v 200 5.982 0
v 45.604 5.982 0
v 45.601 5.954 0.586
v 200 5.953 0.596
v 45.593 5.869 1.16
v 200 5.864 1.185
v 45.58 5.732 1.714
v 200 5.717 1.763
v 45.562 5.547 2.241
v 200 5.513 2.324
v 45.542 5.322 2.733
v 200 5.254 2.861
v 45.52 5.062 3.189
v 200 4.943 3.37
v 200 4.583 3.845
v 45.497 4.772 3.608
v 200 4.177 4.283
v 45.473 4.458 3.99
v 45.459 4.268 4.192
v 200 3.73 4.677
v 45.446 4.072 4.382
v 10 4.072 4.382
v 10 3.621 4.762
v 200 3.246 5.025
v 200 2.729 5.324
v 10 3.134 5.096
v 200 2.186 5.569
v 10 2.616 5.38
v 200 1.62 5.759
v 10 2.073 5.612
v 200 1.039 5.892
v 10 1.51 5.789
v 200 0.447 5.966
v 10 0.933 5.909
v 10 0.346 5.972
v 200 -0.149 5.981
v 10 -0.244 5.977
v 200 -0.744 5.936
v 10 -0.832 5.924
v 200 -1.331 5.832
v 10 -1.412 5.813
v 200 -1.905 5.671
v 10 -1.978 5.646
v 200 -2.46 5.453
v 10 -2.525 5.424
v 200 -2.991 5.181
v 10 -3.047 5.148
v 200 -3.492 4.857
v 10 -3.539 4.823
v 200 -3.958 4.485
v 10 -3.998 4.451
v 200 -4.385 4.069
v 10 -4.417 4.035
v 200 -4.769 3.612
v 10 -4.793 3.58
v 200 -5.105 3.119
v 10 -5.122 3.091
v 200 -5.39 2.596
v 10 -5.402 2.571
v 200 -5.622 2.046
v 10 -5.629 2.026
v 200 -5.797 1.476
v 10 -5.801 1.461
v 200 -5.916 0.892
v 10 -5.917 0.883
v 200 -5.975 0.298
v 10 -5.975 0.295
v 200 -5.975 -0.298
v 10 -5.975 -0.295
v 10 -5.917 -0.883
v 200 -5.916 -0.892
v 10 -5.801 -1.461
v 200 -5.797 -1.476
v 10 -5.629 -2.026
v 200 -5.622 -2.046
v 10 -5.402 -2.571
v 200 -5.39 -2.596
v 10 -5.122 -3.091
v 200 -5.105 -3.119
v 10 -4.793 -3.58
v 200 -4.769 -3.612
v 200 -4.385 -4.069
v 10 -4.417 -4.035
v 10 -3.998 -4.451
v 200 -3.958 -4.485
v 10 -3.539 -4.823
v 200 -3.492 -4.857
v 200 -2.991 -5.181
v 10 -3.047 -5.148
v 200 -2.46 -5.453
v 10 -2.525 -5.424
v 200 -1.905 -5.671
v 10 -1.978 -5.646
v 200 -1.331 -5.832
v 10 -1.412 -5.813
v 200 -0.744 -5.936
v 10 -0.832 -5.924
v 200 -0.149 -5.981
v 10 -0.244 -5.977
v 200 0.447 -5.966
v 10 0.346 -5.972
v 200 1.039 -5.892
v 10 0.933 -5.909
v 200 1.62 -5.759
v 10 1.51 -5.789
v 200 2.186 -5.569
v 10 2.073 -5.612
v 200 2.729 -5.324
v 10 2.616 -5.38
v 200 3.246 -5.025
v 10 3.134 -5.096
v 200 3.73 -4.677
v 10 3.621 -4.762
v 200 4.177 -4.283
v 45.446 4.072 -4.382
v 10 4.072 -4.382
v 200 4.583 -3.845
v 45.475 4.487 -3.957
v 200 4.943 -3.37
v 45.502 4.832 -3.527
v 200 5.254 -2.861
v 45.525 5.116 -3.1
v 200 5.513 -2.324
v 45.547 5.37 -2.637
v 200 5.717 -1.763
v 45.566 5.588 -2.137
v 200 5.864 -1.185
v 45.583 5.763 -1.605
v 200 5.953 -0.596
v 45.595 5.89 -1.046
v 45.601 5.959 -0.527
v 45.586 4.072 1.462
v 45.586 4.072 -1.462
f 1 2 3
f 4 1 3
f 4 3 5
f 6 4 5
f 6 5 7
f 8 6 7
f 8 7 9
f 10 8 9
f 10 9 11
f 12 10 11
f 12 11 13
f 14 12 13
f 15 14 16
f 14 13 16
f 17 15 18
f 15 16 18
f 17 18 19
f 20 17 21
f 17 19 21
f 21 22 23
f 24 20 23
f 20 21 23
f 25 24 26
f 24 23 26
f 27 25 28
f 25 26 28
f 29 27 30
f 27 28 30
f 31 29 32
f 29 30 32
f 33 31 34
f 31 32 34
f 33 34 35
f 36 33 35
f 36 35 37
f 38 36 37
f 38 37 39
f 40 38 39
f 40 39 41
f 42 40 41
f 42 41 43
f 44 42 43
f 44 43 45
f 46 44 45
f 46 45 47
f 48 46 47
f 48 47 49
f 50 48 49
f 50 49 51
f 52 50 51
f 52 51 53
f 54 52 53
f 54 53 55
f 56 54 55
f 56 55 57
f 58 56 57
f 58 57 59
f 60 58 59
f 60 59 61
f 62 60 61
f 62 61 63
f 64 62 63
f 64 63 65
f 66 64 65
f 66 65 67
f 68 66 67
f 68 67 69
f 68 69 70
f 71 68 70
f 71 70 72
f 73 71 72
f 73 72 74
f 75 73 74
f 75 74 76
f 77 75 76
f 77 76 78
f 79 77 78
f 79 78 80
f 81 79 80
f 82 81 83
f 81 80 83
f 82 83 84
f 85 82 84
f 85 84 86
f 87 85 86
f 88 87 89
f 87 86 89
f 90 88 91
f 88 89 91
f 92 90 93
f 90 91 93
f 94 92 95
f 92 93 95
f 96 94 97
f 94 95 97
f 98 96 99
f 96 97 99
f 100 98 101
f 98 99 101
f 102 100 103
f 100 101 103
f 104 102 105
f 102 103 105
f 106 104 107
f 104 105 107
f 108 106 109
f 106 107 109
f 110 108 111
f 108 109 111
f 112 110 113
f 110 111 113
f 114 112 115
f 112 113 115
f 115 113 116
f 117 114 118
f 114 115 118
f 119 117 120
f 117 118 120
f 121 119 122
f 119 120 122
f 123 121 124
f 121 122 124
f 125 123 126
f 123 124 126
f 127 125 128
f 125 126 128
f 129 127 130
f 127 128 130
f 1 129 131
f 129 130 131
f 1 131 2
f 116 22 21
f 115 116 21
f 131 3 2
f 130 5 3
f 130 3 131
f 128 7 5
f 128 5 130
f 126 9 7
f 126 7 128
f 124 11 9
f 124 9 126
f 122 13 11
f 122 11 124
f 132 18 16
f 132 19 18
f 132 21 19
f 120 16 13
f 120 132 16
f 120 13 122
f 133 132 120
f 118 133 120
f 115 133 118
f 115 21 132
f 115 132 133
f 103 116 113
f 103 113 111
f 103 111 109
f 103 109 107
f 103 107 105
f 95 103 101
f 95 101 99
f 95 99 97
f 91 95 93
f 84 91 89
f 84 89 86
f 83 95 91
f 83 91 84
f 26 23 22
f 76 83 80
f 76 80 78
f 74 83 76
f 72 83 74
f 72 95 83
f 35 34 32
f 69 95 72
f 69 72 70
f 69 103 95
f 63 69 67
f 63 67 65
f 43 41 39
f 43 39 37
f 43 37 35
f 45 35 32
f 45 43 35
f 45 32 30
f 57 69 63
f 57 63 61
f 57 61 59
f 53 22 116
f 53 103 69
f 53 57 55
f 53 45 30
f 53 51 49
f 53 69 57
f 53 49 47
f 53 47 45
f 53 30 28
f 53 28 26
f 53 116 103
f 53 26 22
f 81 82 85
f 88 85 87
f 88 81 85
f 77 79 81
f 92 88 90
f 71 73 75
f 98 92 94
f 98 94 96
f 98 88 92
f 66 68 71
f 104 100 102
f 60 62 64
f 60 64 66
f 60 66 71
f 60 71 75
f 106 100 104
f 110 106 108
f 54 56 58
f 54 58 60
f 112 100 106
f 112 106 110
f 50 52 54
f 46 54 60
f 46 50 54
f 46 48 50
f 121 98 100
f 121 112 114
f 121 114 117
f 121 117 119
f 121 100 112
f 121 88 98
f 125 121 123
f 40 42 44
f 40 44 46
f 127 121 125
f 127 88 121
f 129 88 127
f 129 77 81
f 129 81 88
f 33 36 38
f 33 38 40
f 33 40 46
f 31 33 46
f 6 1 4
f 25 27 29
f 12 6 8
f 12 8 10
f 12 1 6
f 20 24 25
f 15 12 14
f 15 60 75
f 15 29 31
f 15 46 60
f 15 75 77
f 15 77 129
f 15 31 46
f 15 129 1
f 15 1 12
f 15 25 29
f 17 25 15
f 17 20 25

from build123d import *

# Parameters (mm, degrees)
F0_R     = 5.982402
F1_DEPTH = 200
F2_W     = 45.446075
F2_H     = 2.038203
F3_DEPTH = 12.5
F4_R     = 61.03573
F5_DEPTH = 25
F6_W     = 51.913552
F6_H     = 32.489951
F7_DEPTH = 10


with BuildPart() as f1:
    # F0 (on Right) → F1 (new body)
    with BuildSketch(Plane.YZ):
        Circle(F0_R)
    extrude(amount=F1_DEPTH)

    # F2 (on Top) → F3 (cut, symmetric)
    with BuildSketch(Plane.XY):
        with Locations((22.723038, 5.091489)):
            Rectangle(F2_W, F2_H)
    extrude(amount=F3_DEPTH, both=True, mode=Mode.SUBTRACT)

    # F4 (on face) → F5 (cut)
    with BuildSketch(Plane(origin=(0, 4.072388, 0), x_dir=(-1, 0, 0), z_dir=(0, 1, 0))):
        with Locations((15.432127, 0)):
            Circle(F4_R)
    extrude(amount=F5_DEPTH, mode=Mode.SUBTRACT)

    # F6 (on face) → F7 (cut)
    with BuildSketch(Plane(origin=(0, 0, 0), x_dir=(0, -1, 0), z_dir=(-1, 0, 0))):
        with Locations((-6.045349, -2.592297)):
            Rectangle(F6_W, F6_H)
    extrude(amount=-F7_DEPTH, mode=Mode.SUBTRACT)


solid = f1.part
